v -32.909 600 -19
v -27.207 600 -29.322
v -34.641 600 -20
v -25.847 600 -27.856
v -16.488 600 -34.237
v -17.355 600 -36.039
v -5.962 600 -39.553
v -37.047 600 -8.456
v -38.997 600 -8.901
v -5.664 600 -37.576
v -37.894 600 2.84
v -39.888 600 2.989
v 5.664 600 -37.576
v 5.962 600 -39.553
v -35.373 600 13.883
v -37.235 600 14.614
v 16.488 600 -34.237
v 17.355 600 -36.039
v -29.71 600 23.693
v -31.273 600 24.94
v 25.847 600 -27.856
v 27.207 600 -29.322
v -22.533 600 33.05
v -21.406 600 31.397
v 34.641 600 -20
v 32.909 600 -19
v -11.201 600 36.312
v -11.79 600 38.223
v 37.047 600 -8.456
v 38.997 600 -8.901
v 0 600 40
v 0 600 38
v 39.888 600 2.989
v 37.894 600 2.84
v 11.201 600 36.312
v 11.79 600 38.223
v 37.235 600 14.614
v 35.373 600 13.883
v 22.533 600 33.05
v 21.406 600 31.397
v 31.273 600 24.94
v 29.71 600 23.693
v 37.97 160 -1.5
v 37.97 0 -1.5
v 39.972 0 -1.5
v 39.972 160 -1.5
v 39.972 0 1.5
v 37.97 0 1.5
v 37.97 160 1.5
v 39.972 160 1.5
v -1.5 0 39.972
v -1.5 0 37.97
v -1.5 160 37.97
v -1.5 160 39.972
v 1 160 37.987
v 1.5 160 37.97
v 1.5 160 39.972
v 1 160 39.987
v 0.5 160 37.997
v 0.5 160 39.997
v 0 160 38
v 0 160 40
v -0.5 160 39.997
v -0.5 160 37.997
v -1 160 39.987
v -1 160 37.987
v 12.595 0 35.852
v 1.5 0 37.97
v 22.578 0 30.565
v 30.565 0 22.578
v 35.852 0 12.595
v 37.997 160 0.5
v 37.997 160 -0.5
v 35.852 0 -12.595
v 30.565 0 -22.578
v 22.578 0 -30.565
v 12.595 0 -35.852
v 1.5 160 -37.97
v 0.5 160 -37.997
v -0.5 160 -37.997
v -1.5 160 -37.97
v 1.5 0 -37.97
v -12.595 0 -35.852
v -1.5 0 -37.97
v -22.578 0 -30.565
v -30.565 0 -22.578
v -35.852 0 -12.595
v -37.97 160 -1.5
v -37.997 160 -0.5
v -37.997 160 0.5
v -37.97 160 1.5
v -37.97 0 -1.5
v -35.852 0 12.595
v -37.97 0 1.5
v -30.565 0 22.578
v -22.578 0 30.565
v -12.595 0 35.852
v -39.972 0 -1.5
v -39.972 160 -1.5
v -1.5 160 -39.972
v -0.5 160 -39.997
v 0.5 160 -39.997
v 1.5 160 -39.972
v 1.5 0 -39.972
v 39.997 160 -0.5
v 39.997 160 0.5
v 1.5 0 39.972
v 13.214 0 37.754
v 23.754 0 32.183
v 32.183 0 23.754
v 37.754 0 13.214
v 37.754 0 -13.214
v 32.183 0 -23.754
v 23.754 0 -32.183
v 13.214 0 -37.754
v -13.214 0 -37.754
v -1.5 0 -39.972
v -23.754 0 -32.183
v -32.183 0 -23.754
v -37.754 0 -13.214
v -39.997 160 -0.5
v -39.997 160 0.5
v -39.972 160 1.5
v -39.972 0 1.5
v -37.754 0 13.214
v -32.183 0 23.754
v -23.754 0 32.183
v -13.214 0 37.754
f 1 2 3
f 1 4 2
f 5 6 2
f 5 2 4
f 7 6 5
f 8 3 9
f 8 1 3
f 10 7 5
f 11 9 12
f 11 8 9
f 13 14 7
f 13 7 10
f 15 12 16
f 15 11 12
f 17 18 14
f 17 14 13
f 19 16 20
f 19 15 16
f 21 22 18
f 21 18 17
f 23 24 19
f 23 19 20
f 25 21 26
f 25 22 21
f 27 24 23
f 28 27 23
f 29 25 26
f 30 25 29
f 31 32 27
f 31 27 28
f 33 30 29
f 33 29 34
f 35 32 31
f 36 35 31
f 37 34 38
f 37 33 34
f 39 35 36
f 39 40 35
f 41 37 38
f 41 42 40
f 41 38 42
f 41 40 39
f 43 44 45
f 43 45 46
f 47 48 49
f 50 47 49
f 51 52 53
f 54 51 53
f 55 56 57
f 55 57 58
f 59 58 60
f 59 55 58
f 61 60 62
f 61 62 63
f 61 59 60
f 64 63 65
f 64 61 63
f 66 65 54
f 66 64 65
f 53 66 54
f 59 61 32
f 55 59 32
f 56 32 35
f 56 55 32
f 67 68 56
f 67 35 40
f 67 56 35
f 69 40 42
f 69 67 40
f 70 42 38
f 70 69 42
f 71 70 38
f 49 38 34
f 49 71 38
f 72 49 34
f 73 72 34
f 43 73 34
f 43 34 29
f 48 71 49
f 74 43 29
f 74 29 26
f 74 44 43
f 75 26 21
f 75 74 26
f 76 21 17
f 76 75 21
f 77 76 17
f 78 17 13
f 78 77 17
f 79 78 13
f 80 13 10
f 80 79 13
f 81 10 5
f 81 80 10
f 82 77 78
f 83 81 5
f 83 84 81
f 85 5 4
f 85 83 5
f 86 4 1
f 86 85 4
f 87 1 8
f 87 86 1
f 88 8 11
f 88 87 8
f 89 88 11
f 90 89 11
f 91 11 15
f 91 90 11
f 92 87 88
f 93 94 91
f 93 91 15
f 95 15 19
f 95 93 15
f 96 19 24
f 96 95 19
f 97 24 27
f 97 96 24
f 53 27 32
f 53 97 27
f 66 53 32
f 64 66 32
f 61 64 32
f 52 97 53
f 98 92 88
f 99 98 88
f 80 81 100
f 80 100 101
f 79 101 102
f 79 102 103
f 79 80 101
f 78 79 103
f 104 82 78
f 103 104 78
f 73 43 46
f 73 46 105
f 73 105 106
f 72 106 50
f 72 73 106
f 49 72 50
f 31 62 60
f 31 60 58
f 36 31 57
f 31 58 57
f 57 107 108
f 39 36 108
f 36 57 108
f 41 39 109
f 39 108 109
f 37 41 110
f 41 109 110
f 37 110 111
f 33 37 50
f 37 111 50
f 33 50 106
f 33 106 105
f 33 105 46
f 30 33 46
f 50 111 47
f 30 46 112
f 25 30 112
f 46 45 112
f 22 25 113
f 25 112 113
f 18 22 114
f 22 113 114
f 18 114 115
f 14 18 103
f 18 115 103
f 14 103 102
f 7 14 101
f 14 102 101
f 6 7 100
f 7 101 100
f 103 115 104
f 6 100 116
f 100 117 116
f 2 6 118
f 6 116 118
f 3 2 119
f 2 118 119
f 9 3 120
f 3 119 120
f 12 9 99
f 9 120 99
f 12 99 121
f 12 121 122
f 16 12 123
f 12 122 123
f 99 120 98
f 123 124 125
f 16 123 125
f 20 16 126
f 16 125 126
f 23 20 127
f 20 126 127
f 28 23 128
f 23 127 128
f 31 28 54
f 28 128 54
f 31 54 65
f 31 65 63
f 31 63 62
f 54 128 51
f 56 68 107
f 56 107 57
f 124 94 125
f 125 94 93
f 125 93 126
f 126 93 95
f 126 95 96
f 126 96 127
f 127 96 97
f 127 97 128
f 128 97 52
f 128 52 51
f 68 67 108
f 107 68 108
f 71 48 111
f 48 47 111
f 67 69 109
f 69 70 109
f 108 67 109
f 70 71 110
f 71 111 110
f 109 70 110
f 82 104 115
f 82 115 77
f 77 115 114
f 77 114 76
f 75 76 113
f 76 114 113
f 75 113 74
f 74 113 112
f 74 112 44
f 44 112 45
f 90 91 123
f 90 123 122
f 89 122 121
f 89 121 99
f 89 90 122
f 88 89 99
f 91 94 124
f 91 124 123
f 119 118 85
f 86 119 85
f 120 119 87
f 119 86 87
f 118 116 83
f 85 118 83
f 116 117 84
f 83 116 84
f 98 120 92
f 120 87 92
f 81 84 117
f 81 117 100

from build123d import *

# Parameters (mm, degrees)
SKETCH1_R           = 40
SKETCH1_R_2         = 38
BOSS_EXTRUDE1_DEPTH = 600
SKETCH2_W           = 3
SKETCH2_H           = 160
CUT_EXTRUDE1_DEPTH  = 603.660766933
CIRPATTERN1_COUNT   = 4


with BuildPart() as part:
    # Sketch1 → Boss-Extrude1 (new body)
    with BuildSketch(Plane(origin=(0, 0, 0), x_dir=(1, 0, 0), z_dir=(0, 1, 0))):
        with Locations(Location((0, 0, 0), (0, 0, 270))):
            Circle(SKETCH1_R)
        with Locations(Location((0, 0, 0), (0, 0, 270))):
            Circle(SKETCH1_R_2, mode=Mode.SUBTRACT)
    extrude(amount=BOSS_EXTRUDE1_DEPTH)

    # Sketch2 → Cut-Extrude1 (cut, through all)
    with BuildSketch(Plane(origin=(0, 0, 0), x_dir=(0, 0, -1), z_dir=(1, 0, 0))):
        with Locations((0, 80)):
            Rectangle(SKETCH2_W, SKETCH2_H)
    cut_extrude1 = extrude(amount=-CUT_EXTRUDE1_DEPTH, mode=Mode.SUBTRACT)

    # CirPattern1: Cut-Extrude1 ×4 about axis
    cirpattern1_axis = Axis((0, 0, 0), (0, 1, 0))
    for i in range(1, CIRPATTERN1_COUNT):
        add(cut_extrude1.rotate(cirpattern1_axis, i * 360 / CIRPATTERN1_COUNT), mode=Mode.SUBTRACT)


solid = part.part
